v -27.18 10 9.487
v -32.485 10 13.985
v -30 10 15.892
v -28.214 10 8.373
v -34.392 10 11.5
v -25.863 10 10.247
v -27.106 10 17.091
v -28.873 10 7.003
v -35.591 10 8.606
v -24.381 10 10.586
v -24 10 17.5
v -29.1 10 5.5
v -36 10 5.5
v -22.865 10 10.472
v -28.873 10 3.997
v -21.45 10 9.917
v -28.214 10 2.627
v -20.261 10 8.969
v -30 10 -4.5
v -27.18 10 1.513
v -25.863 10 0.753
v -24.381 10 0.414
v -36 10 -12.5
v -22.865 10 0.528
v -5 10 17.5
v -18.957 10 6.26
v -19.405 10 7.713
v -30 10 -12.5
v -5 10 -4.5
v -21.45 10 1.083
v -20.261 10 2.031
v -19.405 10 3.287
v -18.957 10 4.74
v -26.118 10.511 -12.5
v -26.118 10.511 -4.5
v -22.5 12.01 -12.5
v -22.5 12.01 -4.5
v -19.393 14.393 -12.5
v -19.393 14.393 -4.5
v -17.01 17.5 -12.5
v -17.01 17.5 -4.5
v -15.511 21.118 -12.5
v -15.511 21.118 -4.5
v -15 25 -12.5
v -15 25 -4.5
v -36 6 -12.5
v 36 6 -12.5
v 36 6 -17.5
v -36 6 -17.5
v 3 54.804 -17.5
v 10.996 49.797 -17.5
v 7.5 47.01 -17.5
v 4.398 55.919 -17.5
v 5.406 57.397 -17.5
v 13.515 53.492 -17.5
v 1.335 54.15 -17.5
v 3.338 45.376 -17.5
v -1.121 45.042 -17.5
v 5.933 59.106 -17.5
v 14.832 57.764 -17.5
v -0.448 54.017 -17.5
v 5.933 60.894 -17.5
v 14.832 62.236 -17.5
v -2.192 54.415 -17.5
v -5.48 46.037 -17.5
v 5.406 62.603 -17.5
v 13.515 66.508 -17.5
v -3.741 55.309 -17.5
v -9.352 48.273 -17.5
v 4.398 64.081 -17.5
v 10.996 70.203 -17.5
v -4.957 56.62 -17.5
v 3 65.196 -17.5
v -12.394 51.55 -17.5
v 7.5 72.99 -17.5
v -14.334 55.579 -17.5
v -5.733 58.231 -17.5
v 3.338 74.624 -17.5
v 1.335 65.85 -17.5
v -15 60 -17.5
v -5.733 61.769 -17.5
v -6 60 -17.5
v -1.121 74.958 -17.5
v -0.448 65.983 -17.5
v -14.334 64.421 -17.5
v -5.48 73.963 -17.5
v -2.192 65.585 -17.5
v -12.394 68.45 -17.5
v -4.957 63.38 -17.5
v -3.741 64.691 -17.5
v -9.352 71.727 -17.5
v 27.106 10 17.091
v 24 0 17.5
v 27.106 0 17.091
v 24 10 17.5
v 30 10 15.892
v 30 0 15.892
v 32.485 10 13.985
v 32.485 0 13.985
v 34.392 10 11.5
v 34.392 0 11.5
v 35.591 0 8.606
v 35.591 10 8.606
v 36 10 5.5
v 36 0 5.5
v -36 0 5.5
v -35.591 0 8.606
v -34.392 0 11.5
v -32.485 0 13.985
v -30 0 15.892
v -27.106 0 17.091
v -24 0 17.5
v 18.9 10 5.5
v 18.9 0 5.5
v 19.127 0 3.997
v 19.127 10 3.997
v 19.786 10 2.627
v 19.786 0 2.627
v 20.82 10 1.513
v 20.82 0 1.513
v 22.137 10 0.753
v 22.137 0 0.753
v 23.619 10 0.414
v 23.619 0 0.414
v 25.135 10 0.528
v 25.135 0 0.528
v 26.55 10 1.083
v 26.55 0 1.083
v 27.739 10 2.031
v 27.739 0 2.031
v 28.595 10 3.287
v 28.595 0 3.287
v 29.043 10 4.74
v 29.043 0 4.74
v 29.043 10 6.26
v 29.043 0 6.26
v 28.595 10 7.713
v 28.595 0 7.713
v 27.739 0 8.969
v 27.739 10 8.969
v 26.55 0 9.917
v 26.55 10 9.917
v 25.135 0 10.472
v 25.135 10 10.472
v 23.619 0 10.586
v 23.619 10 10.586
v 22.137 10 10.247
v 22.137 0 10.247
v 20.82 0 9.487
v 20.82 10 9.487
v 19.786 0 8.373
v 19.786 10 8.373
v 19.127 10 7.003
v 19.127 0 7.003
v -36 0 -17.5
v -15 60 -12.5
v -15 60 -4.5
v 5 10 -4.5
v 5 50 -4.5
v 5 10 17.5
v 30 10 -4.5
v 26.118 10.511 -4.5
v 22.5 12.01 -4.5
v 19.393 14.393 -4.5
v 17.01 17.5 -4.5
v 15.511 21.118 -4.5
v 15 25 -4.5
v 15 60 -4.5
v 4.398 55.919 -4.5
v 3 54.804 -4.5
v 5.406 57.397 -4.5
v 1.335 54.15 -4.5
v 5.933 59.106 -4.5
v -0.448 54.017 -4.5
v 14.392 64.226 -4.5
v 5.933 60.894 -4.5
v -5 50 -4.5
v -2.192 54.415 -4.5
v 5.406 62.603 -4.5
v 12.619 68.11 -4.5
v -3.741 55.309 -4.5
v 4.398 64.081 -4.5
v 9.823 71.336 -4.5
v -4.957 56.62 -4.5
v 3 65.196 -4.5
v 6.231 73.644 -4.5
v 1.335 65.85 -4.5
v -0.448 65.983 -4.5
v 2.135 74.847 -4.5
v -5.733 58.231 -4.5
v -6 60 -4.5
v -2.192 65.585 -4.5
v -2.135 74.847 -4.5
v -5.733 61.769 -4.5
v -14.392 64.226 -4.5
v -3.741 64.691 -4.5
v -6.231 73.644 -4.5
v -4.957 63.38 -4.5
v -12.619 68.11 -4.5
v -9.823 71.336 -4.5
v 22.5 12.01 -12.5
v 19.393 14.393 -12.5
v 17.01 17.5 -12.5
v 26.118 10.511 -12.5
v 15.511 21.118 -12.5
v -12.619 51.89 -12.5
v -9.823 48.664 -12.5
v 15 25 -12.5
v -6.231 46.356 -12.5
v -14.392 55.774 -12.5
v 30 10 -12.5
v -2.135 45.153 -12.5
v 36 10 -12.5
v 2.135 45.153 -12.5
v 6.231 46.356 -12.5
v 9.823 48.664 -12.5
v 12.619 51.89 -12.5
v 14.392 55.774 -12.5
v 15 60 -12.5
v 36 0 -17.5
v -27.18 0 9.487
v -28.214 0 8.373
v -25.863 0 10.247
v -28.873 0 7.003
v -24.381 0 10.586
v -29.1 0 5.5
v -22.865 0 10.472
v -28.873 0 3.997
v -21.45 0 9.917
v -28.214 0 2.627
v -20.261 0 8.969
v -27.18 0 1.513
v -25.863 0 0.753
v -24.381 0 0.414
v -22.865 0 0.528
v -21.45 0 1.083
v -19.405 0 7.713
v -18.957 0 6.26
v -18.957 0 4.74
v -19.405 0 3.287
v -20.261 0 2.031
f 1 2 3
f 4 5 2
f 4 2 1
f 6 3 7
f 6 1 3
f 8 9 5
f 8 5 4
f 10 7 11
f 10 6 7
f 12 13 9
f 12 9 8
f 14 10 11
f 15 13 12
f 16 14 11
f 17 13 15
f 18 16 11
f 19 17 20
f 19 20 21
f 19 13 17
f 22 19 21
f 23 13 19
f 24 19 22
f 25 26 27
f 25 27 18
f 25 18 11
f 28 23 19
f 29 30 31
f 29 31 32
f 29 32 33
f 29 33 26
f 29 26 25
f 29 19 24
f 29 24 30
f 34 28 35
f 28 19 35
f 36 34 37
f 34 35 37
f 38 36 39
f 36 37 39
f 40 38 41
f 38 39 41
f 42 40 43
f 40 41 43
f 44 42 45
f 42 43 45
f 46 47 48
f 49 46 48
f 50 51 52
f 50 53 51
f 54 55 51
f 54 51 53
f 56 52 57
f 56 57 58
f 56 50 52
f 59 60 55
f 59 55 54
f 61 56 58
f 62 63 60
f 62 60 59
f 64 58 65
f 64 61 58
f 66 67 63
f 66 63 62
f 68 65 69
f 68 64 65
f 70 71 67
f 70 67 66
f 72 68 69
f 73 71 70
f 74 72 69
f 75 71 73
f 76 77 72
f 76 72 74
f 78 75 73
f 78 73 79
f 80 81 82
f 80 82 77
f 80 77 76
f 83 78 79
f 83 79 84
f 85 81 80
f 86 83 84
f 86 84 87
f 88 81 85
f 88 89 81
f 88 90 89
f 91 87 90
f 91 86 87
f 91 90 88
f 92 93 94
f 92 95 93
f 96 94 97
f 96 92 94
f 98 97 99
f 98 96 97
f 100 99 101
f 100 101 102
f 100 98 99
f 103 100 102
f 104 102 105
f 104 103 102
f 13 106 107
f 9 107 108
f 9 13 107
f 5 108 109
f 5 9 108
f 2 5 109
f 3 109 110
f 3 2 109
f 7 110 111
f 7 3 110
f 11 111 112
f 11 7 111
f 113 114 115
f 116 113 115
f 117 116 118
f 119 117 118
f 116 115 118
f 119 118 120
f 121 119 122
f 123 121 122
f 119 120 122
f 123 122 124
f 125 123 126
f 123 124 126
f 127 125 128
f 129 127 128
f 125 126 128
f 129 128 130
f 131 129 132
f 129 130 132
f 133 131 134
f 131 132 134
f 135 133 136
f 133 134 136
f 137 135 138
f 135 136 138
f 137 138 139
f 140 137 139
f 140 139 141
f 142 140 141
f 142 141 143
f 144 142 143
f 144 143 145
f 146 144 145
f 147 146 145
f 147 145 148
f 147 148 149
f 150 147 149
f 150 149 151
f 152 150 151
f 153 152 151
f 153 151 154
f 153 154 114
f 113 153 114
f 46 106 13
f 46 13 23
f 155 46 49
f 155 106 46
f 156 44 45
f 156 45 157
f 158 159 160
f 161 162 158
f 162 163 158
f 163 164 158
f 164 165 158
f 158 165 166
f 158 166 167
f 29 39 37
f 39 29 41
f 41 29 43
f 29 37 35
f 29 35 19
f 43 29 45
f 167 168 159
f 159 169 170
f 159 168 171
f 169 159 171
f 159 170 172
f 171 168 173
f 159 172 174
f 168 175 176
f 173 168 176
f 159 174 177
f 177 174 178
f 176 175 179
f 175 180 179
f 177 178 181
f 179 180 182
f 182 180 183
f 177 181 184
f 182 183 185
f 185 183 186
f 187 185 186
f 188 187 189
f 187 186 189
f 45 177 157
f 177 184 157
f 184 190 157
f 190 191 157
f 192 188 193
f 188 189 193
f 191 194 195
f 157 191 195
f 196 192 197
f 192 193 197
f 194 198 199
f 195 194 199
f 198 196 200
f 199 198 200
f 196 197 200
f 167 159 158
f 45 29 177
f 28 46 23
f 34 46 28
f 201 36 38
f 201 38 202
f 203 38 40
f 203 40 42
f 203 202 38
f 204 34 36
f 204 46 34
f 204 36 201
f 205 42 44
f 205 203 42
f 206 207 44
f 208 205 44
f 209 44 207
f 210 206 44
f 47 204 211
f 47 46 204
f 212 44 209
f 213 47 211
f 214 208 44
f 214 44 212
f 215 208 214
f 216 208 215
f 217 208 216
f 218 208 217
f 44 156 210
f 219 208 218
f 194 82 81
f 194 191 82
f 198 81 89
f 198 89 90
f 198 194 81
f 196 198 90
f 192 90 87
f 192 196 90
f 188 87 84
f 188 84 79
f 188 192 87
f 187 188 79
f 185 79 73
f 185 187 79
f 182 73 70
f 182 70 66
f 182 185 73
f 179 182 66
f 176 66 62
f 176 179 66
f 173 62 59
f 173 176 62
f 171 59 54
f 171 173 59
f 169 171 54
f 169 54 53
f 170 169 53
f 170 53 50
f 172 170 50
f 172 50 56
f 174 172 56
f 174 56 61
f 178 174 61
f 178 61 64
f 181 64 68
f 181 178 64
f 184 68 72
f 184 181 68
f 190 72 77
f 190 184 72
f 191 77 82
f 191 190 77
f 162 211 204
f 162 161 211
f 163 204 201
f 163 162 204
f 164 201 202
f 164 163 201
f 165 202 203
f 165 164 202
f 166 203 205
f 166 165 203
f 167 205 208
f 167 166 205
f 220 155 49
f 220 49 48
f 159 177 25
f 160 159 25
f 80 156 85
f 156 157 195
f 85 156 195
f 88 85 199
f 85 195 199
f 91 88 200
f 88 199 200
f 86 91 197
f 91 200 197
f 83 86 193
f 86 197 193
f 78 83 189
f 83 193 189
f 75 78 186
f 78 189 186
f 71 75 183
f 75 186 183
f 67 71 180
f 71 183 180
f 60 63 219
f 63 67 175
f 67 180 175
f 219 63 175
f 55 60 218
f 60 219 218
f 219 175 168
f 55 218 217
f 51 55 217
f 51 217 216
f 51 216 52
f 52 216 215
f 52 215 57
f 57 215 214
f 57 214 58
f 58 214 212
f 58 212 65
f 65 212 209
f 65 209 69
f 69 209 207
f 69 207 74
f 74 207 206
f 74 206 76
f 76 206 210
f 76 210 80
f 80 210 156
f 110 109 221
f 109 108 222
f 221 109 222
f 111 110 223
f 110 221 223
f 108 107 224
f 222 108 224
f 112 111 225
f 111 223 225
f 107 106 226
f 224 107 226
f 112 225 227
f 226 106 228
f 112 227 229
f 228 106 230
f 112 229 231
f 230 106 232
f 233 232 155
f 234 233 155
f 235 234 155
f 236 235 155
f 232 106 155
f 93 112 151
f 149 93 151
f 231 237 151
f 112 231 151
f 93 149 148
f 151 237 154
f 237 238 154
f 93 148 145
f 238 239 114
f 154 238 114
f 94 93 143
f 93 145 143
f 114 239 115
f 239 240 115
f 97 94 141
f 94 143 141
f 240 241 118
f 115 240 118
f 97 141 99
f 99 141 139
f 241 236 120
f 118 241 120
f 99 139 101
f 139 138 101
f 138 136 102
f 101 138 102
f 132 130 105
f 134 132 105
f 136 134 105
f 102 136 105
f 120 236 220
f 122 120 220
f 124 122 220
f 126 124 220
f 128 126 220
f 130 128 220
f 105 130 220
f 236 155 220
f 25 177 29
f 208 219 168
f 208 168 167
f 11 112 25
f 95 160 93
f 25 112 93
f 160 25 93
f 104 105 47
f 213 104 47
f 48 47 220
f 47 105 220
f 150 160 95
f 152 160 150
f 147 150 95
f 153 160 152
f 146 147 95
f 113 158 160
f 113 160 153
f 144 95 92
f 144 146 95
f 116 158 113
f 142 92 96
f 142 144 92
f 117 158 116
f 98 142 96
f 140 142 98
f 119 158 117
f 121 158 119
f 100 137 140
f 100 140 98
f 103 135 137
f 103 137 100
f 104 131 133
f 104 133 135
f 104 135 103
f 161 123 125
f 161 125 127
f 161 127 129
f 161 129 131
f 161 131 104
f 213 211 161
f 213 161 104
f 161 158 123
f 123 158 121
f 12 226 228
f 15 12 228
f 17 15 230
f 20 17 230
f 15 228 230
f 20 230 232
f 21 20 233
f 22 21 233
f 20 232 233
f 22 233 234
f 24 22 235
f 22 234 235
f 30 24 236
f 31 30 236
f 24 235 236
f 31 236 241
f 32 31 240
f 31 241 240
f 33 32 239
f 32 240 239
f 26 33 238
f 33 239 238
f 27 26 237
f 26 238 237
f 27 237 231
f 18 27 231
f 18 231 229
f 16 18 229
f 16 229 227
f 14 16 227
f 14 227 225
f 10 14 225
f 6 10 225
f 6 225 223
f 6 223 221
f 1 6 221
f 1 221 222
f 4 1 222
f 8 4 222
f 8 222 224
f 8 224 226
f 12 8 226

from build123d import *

# Parameters (mm, degrees)
SKETCH1_W           = 72
SKETCH1_H           = 35
BOSS_EXTRUDE1_DEPTH = 10
FILLET1_R           = 12
SKETCH3_W           = 5
SKETCH3_H           = 4
CUT_EXTRUDE1_DEPTH  = 75.767974428
SKETCH4_R           = 6
BOSS_EXTRUDE2_DEPTH = 8
FILLET2_R           = 15
M12_TAPPED_HOLE1_D  = 10.2
SKETCH7_R           = 15
SKETCH7_R_2         = 6
BOSS_EXTRUDE3_DEPTH = 5
RIB1_REACH          = 87.013
SKETCH8_WALL_W      = 217.67731737
SKETCH8_WALL_H      = 10


with BuildPart() as part:
    # Sketch1 → Boss-Extrude1 (new body)
    with BuildSketch(Plane(origin=(0, 0, 0), x_dir=(1, 0, 0), z_dir=(0, 1, 0))):
        Rectangle(SKETCH1_W, SKETCH1_H)
    extrude(amount=BOSS_EXTRUDE1_DEPTH)

    # Fillet1
    fillet1_edges = [part.edges().sort_by_distance(p)[0] for p in [
        (36, 5, 17.5),
        (-36, 5, 17.5),
    ]]
    fillet(fillet1_edges, radius=FILLET1_R)

    # Sketch3 → Cut-Extrude1 (cut, through all)
    with BuildSketch(Plane(origin=(36, 0, 0), x_dir=(0, 0, -1), z_dir=(1, 0, 0))):
        with Locations((15, 8)):
            Rectangle(SKETCH3_W, SKETCH3_H)
    extrude(amount=-CUT_EXTRUDE1_DEPTH, mode=Mode.SUBTRACT)

    # Sketch4 → Boss-Extrude2 (add)
    with BuildSketch(Plane(origin=(0, 0, -12.5), x_dir=(-1, 0, 0), z_dir=(0, 0, -1))):
        with BuildLine():
            Line((-15, 10), (15, 10))
            Line((15, 10), (15, 60))
            ThreePointArc((15, 60), (0, 75), (-15, 60))
            Line((-15, 60), (-15, 10))
        make_face()
        with Locations((0, 60)):
            Circle(SKETCH4_R, mode=Mode.SUBTRACT)
    extrude(amount=-BOSS_EXTRUDE2_DEPTH)

    # Fillet2
    fillet2_edges = [part.edges().sort_by_distance(p)[0] for p in [
        (15, 10, -8.5),
        (-15, 10, -8.5),
    ]]
    fillet(fillet2_edges, radius=FILLET2_R)

    # M12 Tapped Hole1 (through all)
    with Locations(Plane(origin=(0, 10, 0), x_dir=(1, 0, 0), z_dir=(0, 1, 0))):
        with Locations((-24, -5.5), (24, -5.5)):
            Hole(M12_TAPPED_HOLE1_D / 2)

    # Sketch7 → Boss-Extrude3 (add)
    with BuildSketch(Plane(origin=(0, 0, -12.5), x_dir=(-1, 0, 0), z_dir=(0, 0, -1))):
        with Locations((0, 60)):
            Circle(SKETCH7_R)
        with Locations((0, 60)):
            Circle(SKETCH7_R_2, mode=Mode.SUBTRACT)
    extrude(amount=BOSS_EXTRUDE3_DEPTH)

    # Sketch8 wall → Rib1 (add, up to next)
    with BuildSketch(Plane(origin=(0, 30, 6.5), x_dir=(0, -0.876215908677, 0.481918749772), z_dir=(0, -0.481918749772, -0.876215908677)), mode=Mode.PRIVATE) as rib1_sk1:
        Rectangle(SKETCH8_WALL_W, SKETCH8_WALL_H)
    rib1_tool1 = extrude(rib1_sk1.sketch, amount=RIB1_REACH, mode=Mode.PRIVATE) - part.part
    add(rib1_tool1.solids().sort_by_distance((0, 30, 6.5))[0])


solid = part.part
